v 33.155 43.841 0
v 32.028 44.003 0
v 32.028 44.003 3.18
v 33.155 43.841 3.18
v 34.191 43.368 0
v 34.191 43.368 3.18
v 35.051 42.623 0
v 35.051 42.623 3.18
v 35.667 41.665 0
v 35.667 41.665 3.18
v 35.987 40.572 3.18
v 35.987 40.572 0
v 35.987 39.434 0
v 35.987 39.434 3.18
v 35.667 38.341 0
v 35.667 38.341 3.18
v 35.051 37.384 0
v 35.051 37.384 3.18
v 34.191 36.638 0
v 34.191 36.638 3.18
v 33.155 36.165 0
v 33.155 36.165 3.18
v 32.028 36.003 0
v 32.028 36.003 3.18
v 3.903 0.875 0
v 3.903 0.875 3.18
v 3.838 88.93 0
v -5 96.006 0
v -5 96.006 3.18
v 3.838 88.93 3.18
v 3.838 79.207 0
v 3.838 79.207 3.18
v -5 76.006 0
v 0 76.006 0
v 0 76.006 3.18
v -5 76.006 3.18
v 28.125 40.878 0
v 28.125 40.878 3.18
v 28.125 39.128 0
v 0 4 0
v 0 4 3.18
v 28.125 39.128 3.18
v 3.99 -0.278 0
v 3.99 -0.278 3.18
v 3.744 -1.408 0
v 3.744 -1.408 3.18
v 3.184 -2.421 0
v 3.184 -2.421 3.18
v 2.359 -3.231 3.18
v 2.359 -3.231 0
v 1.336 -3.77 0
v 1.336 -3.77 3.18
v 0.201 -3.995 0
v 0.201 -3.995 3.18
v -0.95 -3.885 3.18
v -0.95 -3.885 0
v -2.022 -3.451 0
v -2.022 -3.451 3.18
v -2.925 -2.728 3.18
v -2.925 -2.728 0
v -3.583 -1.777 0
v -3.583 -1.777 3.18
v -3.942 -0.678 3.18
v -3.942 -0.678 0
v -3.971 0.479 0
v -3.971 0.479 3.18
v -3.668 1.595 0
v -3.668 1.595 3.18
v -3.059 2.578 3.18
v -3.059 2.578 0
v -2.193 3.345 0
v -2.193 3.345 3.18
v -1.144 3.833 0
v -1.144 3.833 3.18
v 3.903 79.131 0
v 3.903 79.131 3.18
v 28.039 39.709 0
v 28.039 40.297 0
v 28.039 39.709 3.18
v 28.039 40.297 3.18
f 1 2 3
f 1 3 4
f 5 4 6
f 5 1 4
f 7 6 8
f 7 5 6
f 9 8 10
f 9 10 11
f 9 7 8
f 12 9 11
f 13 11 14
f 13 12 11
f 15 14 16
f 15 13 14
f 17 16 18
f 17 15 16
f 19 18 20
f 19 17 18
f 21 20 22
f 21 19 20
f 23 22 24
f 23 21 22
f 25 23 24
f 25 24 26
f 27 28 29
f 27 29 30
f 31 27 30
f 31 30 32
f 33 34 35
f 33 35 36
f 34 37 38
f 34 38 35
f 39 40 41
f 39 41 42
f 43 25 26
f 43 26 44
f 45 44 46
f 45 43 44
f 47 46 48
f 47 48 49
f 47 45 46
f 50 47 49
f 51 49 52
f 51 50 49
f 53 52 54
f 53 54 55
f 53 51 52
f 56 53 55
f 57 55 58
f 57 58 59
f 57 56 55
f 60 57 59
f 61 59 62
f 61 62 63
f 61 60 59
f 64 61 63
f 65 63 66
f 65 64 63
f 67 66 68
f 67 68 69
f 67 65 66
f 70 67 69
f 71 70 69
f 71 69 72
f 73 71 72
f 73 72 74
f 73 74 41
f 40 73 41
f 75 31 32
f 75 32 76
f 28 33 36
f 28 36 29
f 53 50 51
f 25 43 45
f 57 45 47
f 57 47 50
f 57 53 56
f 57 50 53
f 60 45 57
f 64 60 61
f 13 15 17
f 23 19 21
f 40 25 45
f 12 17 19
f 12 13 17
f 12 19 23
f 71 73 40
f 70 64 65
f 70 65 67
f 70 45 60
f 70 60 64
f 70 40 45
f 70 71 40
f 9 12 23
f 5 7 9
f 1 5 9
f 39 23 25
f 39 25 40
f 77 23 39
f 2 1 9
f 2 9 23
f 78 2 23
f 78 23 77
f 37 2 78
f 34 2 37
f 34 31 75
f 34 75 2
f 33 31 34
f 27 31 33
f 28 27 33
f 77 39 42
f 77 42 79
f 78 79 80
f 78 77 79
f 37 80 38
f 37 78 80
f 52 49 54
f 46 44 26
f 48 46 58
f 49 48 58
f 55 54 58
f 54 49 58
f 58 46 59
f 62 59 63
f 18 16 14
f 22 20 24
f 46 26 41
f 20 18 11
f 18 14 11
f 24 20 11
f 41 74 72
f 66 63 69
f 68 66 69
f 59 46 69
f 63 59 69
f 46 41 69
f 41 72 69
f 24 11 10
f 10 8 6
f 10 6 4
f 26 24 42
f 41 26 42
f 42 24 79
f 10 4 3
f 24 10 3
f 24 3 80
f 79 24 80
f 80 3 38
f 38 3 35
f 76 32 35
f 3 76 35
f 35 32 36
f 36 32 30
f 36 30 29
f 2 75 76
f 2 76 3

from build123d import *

# Parameters (mm, degrees)
BOSS_EXTRUDE1_DEPTH = 3.18


with BuildPart() as part:
    # Sketch1 → Boss-Extrude1 (new body)
    with BuildSketch(Plane.XY):
        with BuildLine():
            Line((0, 4), (28.125, 39.128113741))
            ThreePointArc((28.125, 39.128113741), (28.028123749, 40.003113741), (28.125, 40.878113741))
            Line((28.125, 40.878113741), (0, 76.006227482))
            Line((0, 76.006227482), (-5, 76.006227482))
            Line((-5, 76.006227482), (-5, 96.006227482))
            Line((-5, 96.006227482), (3.838218952, 88.929989064))
            Line((3.838218952, 88.929989064), (3.838218952, 79.20730223))
            Line((3.838218952, 79.20730223), (3.903123749, 79.131227482))
            Line((3.903123749, 79.131227482), (32.028123749, 44.003113741))
            ThreePointArc((32.028123749, 44.003113741), (36.028123749, 40.003113741), (32.028123749, 36.003113741))
            Line((32.028123749, 36.003113741), (3.903123749, 0.875))
            ThreePointArc((3.903123749, 0.875), (-2.5, -3.122498999), (0, 4))
        make_face()
    extrude(amount=BOSS_EXTRUDE1_DEPTH)


solid = part.part
